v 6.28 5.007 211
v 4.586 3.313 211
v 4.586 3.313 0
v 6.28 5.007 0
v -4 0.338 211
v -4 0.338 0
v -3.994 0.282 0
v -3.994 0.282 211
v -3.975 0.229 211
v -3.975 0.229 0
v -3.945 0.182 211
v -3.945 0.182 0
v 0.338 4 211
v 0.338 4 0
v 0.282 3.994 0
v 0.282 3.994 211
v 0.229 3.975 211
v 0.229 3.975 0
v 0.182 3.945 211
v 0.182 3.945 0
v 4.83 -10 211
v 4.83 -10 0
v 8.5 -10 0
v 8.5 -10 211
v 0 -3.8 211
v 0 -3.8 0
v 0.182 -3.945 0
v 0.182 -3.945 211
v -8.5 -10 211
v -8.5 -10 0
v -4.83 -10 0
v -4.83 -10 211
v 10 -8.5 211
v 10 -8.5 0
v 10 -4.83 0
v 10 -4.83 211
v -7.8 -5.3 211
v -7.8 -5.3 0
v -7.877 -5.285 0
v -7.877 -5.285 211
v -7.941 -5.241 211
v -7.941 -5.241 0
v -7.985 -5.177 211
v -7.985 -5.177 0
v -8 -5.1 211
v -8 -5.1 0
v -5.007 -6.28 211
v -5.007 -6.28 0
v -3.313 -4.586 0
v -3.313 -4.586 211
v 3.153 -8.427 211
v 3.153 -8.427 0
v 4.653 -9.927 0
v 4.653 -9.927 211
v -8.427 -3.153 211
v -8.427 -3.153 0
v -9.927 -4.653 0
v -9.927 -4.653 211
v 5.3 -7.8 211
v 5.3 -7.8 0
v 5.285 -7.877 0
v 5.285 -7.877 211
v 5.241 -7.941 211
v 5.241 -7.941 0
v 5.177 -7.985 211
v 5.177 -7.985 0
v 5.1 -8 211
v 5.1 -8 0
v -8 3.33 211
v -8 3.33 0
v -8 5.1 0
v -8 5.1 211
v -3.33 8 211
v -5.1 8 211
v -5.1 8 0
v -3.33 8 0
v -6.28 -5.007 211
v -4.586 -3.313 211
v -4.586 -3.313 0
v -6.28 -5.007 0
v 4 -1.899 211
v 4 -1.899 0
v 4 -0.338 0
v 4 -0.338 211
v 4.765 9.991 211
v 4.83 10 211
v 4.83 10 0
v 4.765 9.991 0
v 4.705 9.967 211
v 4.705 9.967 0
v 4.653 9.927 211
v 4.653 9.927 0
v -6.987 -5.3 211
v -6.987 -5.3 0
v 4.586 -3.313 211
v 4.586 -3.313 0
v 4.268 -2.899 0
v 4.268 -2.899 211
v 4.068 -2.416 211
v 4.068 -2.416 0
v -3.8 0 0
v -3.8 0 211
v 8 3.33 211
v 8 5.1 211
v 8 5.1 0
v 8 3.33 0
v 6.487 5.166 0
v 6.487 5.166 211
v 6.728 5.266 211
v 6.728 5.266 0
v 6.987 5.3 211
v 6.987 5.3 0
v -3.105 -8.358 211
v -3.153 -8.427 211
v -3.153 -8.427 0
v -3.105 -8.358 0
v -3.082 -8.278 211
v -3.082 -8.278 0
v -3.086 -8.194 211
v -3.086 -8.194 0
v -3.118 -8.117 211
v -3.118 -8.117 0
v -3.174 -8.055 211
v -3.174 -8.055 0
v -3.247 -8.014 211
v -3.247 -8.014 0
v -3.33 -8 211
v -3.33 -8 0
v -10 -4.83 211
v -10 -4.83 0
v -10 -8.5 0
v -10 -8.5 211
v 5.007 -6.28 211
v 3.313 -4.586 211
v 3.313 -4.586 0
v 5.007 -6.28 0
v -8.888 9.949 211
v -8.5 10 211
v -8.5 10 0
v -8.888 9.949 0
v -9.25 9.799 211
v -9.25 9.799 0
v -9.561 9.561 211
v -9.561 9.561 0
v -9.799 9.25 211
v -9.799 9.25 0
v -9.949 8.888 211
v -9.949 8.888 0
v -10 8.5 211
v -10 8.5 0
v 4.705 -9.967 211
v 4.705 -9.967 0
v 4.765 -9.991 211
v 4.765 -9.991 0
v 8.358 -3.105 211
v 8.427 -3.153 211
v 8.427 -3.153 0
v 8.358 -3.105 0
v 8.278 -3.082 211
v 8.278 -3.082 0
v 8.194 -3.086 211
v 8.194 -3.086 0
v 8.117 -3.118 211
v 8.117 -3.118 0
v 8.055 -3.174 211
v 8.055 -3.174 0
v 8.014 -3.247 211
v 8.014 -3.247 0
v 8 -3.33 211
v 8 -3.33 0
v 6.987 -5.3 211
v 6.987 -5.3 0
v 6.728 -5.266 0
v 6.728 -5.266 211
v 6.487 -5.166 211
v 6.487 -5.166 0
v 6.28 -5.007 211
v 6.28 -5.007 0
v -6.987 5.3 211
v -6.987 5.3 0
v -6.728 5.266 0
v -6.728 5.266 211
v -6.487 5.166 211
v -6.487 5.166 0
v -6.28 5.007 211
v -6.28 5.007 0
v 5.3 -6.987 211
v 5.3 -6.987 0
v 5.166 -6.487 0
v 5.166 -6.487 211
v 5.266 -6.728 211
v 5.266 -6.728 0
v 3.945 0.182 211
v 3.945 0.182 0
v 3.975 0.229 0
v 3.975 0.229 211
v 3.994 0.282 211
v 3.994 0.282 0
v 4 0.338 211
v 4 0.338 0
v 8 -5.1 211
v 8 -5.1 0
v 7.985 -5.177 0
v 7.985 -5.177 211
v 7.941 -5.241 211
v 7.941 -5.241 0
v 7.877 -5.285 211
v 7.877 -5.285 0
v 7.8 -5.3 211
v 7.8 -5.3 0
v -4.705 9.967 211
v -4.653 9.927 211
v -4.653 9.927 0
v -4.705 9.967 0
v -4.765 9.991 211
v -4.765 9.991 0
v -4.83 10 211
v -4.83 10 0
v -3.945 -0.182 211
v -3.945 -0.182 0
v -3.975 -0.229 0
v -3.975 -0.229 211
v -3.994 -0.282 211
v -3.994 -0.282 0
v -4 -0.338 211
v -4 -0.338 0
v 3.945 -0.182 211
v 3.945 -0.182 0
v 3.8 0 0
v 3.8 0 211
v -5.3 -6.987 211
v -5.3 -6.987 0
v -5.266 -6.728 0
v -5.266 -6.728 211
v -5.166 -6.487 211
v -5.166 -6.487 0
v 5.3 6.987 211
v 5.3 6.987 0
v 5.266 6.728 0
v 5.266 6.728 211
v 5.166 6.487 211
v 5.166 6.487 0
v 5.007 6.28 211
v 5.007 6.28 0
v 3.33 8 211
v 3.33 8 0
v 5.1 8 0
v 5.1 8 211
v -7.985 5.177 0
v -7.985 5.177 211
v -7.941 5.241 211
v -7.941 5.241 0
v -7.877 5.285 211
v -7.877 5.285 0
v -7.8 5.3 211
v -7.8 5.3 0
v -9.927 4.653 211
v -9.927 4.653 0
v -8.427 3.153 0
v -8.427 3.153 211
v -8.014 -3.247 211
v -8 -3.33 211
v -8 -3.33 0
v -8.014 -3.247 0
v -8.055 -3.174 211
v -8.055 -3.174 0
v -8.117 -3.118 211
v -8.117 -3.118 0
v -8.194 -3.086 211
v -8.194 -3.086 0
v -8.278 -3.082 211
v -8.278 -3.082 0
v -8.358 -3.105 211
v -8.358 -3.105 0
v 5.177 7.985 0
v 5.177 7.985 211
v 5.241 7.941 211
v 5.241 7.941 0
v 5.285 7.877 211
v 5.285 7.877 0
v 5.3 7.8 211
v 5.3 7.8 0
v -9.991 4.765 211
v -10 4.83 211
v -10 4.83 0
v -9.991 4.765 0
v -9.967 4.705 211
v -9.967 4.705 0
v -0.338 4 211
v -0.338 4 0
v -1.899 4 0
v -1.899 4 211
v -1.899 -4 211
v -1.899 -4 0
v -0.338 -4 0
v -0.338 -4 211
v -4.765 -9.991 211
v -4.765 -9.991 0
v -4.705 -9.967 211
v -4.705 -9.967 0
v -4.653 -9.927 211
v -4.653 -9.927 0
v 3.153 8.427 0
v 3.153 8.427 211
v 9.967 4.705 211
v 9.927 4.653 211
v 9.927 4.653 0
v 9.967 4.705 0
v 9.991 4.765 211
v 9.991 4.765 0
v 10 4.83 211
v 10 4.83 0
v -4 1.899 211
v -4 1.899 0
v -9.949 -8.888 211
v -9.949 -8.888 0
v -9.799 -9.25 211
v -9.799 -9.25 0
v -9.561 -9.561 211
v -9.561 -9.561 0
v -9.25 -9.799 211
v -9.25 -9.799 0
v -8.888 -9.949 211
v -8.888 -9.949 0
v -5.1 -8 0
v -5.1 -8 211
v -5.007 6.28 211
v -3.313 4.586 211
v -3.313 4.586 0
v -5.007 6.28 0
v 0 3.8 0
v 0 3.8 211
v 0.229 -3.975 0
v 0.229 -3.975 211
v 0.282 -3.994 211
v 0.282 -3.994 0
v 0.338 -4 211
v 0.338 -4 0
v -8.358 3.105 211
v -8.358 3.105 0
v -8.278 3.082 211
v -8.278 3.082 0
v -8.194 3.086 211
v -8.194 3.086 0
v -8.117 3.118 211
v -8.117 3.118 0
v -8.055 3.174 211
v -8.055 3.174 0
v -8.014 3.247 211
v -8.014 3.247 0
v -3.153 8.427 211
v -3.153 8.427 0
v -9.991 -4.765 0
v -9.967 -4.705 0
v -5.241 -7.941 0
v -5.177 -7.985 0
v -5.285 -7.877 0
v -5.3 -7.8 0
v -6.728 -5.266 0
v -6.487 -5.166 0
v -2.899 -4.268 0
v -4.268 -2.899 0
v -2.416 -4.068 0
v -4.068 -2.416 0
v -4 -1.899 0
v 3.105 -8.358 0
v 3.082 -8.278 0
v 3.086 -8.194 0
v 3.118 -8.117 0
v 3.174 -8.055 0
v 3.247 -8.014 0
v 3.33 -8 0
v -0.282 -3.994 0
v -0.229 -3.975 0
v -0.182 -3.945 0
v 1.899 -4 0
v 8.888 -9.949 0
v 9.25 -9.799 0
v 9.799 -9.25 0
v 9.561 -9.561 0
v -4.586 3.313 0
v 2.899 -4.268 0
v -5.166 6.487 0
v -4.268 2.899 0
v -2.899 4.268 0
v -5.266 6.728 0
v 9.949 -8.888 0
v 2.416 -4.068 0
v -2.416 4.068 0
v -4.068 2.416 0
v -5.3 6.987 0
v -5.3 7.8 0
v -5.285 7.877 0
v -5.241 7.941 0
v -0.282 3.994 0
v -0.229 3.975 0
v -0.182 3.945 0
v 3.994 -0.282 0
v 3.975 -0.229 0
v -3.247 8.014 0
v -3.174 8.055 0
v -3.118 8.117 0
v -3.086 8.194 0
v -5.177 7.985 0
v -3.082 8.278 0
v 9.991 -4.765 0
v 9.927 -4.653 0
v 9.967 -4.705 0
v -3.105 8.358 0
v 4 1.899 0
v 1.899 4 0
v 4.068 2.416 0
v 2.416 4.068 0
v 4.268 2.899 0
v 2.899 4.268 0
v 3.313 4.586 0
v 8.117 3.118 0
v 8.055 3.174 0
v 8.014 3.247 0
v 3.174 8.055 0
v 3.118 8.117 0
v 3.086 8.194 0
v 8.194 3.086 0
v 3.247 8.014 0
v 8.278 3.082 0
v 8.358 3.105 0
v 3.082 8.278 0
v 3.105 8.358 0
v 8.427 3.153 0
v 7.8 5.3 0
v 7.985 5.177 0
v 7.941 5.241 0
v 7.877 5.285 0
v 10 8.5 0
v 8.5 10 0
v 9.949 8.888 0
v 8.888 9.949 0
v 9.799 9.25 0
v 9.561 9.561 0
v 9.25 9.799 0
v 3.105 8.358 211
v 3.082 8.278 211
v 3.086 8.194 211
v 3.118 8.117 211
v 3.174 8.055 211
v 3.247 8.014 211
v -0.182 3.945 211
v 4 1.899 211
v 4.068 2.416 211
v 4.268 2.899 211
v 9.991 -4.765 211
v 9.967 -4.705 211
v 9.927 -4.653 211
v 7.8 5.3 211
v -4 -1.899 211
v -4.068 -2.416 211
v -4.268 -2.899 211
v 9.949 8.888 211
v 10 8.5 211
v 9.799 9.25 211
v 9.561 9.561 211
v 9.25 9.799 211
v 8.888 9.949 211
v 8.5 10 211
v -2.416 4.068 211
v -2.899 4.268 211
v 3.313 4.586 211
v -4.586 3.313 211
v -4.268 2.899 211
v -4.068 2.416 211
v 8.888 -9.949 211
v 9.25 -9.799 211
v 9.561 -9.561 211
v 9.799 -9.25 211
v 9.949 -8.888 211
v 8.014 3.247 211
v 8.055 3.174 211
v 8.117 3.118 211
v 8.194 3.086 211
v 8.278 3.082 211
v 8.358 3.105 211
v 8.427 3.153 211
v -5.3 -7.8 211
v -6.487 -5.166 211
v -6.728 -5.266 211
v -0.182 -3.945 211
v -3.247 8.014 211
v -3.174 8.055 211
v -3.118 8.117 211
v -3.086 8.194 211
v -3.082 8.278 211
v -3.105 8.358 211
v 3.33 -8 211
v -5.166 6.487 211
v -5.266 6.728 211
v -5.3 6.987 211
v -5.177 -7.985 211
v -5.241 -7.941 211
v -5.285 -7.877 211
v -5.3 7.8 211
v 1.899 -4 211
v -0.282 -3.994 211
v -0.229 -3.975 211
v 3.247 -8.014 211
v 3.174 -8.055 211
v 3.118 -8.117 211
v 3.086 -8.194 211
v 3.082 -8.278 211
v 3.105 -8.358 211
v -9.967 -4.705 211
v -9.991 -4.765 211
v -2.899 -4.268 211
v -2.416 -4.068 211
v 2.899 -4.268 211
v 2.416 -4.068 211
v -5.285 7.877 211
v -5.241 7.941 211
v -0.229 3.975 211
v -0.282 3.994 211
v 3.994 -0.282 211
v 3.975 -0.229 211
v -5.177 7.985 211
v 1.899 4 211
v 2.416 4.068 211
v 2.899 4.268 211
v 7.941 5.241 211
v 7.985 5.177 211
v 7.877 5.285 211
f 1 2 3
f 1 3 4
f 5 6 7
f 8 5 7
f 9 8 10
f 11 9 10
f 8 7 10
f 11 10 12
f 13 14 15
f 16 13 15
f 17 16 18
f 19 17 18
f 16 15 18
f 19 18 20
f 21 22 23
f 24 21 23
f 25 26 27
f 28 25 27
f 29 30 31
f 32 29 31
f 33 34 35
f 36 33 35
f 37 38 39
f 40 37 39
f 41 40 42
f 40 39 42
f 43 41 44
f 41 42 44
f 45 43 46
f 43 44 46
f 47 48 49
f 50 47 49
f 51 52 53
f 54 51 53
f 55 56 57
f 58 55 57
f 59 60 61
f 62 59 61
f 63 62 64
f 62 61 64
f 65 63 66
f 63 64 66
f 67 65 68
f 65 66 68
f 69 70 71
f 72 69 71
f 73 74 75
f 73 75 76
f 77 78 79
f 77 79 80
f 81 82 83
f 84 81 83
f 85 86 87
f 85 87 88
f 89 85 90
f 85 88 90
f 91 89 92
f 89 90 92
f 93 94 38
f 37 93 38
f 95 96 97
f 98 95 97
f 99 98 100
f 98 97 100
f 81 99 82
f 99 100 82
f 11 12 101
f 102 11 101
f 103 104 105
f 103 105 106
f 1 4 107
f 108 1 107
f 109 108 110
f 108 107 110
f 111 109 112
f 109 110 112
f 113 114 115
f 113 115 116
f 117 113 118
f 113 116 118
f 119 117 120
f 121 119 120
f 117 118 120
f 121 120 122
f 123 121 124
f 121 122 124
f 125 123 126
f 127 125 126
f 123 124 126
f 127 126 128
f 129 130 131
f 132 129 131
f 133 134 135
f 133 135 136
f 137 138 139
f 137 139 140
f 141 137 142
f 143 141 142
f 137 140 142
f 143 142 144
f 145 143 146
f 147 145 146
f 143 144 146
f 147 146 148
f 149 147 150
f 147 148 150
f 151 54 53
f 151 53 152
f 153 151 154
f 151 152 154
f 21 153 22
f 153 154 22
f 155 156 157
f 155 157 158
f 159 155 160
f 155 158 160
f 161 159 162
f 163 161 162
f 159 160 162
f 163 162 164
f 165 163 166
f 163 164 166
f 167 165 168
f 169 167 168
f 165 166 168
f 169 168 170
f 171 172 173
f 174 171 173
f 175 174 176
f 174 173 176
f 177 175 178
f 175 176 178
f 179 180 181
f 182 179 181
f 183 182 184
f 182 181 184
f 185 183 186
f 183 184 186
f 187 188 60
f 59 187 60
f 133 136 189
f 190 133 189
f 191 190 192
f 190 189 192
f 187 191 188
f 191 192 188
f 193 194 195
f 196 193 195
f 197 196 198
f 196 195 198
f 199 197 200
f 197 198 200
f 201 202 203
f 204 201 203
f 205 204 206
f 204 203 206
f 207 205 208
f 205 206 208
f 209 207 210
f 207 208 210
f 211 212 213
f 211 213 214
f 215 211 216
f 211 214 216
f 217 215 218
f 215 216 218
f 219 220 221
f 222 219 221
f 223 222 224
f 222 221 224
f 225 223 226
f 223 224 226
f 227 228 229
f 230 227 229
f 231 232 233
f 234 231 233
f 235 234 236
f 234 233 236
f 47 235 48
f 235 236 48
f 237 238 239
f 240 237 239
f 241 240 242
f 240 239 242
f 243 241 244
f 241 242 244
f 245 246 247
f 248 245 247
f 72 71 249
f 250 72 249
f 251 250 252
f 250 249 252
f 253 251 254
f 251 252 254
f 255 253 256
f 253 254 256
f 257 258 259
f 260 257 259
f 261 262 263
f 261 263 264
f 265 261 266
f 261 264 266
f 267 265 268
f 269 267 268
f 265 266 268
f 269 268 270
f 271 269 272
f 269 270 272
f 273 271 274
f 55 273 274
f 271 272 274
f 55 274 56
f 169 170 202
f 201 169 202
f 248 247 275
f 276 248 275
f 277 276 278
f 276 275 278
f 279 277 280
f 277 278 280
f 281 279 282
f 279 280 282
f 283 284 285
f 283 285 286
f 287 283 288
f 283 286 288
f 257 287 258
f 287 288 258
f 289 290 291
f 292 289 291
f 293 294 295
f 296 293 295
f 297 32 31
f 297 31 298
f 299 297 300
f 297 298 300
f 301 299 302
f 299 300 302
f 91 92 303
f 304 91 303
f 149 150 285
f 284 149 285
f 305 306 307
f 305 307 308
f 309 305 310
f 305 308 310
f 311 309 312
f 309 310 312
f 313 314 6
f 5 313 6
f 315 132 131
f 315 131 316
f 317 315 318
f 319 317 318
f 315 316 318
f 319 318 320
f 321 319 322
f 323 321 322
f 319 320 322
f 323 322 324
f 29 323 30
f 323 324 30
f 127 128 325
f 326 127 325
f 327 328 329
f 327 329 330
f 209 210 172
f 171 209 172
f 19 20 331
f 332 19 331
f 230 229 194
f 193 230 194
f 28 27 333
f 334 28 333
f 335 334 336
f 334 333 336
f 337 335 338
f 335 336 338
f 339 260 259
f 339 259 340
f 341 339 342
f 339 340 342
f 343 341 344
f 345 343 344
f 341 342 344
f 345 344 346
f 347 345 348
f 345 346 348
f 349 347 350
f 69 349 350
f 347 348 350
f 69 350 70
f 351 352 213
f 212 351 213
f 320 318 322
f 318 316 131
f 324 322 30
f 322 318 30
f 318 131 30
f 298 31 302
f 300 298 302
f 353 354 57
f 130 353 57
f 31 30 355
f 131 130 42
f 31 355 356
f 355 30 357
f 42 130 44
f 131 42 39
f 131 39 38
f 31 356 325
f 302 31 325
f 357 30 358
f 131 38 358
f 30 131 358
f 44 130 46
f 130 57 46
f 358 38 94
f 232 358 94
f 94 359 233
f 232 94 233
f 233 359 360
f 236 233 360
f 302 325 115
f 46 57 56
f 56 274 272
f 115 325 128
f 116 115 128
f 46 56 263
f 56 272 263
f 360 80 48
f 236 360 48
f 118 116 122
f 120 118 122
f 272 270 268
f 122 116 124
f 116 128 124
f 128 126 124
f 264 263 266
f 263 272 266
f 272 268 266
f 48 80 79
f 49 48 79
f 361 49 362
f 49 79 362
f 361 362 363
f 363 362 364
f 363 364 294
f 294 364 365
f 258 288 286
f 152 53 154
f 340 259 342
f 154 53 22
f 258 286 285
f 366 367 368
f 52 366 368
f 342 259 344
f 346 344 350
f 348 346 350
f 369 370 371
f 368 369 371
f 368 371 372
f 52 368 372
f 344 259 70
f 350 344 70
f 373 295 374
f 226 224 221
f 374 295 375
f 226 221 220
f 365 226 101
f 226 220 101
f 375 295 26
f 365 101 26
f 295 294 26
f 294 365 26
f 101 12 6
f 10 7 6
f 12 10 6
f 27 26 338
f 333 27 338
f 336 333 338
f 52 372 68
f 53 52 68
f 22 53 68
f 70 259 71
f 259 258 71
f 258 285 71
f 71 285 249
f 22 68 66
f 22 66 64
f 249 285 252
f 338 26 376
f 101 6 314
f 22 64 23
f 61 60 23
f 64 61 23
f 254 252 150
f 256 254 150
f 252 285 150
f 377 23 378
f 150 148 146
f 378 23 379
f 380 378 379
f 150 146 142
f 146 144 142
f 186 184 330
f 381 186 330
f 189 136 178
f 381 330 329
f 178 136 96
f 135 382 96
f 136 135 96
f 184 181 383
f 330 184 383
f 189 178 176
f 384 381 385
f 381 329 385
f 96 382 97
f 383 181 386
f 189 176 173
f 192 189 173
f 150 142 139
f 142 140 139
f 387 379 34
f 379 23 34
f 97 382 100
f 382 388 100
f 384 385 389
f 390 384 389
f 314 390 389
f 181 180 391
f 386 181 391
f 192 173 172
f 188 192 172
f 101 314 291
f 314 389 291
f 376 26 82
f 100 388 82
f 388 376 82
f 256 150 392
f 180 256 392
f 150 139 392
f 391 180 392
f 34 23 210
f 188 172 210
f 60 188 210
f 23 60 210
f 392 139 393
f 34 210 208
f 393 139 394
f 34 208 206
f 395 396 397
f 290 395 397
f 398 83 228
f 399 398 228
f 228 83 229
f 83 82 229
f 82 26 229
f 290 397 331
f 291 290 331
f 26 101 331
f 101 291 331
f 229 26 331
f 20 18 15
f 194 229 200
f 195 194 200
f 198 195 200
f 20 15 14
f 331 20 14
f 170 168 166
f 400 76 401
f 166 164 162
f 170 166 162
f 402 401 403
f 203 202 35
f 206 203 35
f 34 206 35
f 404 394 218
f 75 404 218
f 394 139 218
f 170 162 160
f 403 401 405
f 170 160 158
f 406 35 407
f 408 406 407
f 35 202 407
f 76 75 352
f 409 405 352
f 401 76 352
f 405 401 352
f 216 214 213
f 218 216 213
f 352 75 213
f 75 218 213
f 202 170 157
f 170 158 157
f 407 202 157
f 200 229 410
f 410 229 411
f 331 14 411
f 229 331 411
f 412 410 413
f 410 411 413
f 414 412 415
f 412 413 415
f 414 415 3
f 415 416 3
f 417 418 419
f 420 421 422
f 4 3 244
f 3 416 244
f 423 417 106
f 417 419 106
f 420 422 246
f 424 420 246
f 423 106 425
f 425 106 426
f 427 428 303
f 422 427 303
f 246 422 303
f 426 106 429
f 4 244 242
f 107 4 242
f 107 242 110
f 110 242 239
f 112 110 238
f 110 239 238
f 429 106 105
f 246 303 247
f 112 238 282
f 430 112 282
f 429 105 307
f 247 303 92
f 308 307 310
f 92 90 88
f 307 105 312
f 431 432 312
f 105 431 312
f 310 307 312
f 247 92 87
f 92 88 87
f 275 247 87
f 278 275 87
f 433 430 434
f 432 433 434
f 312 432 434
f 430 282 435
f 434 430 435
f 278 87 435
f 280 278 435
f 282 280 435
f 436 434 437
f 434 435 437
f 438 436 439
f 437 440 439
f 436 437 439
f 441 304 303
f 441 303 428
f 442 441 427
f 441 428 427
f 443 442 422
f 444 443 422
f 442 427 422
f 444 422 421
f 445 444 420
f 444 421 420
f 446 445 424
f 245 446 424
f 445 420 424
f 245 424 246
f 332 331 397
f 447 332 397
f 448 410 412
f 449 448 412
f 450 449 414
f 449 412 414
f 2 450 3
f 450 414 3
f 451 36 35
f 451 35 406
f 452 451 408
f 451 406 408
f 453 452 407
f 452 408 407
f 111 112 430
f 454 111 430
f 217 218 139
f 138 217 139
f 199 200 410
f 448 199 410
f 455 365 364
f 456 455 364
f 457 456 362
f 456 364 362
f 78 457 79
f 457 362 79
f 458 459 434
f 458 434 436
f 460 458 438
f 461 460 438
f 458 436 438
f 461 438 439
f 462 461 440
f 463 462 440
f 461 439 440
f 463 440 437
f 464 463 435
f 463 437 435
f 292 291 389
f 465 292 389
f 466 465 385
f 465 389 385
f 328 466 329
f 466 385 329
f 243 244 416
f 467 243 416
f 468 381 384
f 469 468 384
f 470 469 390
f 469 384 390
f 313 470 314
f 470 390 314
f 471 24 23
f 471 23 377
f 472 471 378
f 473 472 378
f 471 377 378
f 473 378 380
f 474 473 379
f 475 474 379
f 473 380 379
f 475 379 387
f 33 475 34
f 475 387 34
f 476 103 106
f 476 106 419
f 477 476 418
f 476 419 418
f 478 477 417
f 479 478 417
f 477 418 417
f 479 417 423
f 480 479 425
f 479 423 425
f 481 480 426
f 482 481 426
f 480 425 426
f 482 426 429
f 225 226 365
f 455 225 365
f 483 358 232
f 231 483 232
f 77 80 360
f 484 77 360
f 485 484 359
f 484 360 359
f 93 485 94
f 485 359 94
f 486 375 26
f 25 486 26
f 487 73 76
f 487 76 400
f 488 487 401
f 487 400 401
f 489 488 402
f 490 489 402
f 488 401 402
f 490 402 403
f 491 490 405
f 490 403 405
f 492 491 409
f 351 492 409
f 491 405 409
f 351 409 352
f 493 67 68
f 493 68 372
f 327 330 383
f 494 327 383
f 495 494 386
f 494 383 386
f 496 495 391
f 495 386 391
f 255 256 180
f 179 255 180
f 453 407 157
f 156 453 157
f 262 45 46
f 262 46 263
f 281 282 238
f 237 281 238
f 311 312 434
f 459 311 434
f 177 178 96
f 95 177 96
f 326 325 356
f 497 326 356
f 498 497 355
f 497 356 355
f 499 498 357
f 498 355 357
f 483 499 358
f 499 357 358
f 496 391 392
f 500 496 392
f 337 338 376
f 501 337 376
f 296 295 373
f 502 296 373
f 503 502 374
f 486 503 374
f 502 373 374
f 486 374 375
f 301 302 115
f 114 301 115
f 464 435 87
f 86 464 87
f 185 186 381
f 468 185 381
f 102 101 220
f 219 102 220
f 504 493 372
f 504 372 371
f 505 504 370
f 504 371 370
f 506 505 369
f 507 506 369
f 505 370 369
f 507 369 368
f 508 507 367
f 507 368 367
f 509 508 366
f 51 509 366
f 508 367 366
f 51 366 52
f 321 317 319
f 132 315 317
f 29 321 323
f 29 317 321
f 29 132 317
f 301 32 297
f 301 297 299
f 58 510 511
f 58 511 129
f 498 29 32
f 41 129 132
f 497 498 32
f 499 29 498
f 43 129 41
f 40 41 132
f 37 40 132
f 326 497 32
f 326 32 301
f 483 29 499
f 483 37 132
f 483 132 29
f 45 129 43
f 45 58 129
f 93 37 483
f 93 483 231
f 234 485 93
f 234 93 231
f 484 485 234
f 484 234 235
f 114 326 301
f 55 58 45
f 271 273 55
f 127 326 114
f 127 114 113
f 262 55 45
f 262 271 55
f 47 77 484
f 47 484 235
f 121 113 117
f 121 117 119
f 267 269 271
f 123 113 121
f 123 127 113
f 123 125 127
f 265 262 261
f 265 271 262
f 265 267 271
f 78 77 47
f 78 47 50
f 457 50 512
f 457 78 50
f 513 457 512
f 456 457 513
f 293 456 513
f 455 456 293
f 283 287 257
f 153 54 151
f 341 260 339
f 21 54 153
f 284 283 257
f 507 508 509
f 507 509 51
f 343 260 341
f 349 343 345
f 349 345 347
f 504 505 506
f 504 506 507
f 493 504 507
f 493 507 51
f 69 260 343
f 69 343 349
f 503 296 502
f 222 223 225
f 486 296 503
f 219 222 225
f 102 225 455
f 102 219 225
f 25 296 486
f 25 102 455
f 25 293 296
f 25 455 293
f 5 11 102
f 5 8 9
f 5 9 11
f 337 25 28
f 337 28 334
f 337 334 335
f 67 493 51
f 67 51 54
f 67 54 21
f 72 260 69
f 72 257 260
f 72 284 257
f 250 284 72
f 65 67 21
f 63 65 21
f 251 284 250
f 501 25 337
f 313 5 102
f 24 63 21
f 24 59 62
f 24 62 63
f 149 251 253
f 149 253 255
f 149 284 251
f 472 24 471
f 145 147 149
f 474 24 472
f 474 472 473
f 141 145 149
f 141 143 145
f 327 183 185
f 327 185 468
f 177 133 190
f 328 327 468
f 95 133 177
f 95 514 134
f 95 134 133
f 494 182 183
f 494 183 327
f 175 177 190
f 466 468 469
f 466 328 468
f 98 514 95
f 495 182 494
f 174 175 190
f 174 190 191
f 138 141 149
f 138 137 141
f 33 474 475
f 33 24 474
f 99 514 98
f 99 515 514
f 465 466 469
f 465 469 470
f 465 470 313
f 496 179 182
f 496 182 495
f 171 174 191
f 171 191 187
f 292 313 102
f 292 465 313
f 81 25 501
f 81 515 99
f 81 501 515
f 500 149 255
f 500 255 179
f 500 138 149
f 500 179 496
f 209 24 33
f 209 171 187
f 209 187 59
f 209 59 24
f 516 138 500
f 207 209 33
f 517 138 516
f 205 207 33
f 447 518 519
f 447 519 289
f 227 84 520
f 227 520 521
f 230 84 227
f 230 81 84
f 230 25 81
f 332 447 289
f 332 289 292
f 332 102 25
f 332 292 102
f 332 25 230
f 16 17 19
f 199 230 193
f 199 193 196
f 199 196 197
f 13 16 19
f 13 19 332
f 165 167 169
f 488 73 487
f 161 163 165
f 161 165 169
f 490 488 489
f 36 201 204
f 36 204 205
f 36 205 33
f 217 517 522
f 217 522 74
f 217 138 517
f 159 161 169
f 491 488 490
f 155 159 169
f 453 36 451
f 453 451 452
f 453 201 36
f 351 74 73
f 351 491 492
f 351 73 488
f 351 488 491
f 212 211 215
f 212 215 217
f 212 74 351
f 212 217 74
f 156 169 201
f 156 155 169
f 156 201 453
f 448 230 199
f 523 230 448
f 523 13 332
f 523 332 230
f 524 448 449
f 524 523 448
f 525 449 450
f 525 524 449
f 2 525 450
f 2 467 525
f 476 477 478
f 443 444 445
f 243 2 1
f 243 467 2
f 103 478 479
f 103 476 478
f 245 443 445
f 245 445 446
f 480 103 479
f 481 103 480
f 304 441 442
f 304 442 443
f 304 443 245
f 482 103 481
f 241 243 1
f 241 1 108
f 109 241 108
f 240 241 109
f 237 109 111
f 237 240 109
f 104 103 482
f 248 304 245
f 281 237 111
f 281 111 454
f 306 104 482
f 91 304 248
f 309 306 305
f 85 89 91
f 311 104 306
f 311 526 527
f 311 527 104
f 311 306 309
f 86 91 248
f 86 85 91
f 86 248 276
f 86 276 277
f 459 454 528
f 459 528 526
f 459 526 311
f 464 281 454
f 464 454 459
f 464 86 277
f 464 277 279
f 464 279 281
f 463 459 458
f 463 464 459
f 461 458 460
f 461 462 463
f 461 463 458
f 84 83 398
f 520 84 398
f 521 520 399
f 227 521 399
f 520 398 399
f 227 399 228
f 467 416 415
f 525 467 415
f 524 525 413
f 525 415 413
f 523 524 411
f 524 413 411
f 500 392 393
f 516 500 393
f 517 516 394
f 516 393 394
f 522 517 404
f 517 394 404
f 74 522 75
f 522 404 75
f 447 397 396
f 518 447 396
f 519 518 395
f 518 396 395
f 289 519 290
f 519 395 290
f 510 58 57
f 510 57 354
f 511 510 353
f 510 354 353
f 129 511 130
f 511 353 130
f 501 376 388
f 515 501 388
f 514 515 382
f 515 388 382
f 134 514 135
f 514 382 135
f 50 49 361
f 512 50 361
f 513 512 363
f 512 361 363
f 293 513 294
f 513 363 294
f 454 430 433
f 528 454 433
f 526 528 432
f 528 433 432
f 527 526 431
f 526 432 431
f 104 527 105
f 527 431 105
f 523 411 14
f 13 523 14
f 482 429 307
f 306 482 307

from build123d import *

# Parameters (mm, degrees)
EXTRUDE_1_DEPTH = 211


# Read off the part's stored shape, not the designer's step: 222 Конструкционный профиль 20х20-1-surface1
with BuildPart() as part:
    # Эскиз1 → Бобышка-Вытянуть1 (new body)
    with BuildSketch(Plane.XY):
        with BuildLine():
            Line((-3.945217202, 0.181521503), (-3.8, 0))
            Line((-3.8, 0), (-3.945217202, -0.181521503))
            ThreePointArc((-3.945217202, -0.181521503), (-3.98590708, -0.254943529), (-4, -0.337695265))
            Line((-4, -0.337695265), (-4, -1.898780669))
            ThreePointArc((-4, -1.898780669), (-4.152240935, -2.664147534), (-4.585786438, -3.312994231))
            Line((-4.585786438, -3.312994231), (-6.279898987, -5.007106781))
            ThreePointArc((-6.279898987, -5.007106781), (-6.604322336, -5.223879533), (-6.987005769, -5.3))
            Line((-6.987005769, -5.3), (-7.8, -5.3))
            ThreePointArc((-7.8, -5.3), (-7.941421356, -5.241421356), (-8, -5.1))
            Line((-8, -5.1), (-8, -3.33))
            ThreePointArc((-8, -3.33), (-8.154329142, -3.099030117), (-8.426776695, -3.153223305))
            Line((-8.426776695, -3.153223305), (-9.926776695, -4.653223305))
            ThreePointArc((-9.926776695, -4.653223305), (-9.980969883, -4.734329142), (-10, -4.83))
            Line((-10, -4.83), (-10, -8.5))
            ThreePointArc((-10, -8.5), (-9.560660172, -9.560660172), (-8.5, -10))
            Line((-8.5, -10), (-4.83, -10))
            ThreePointArc((-4.83, -10), (-4.734329142, -9.980969883), (-4.653223305, -9.926776695))
            Line((-4.653223305, -9.926776695), (-3.153223305, -8.426776695))
            ThreePointArc((-3.153223305, -8.426776695), (-3.099030117, -8.154329142), (-3.33, -8))
            Line((-3.33, -8), (-5.1, -8))
            ThreePointArc((-5.1, -8), (-5.241421356, -7.941421356), (-5.3, -7.8))
            Line((-5.3, -7.8), (-5.3, -6.987005769))
            ThreePointArc((-5.3, -6.987005769), (-5.223879533, -6.604322336), (-5.007106781, -6.279898987))
            Line((-5.007106781, -6.279898987), (-3.312994231, -4.585786438))
            ThreePointArc((-3.312994231, -4.585786438), (-2.664147534, -4.152240935), (-1.898780669, -4))
            Line((-1.898780669, -4), (-0.337695265, -4))
            ThreePointArc((-0.337695265, -4), (-0.254943529, -3.98590708), (-0.181521503, -3.945217202))
            Line((-0.181521503, -3.945217202), (0, -3.8))
            Line((0, -3.8), (0.181521503, -3.945217202))
            ThreePointArc((0.181521503, -3.945217202), (0.254943529, -3.98590708), (0.337695265, -4))
            Line((0.337695265, -4), (1.898780669, -4))
            ThreePointArc((1.898780669, -4), (2.664147534, -4.152240935), (3.312994231, -4.585786438))
            Line((3.312994231, -4.585786438), (5.007106781, -6.279898987))
            ThreePointArc((5.007106781, -6.279898987), (5.223879533, -6.604322336), (5.3, -6.987005769))
            Line((5.3, -6.987005769), (5.3, -7.8))
            ThreePointArc((5.3, -7.8), (5.241421356, -7.941421356), (5.1, -8))
            Line((5.1, -8), (3.33, -8))
            ThreePointArc((3.33, -8), (3.099030117, -8.154329142), (3.153223305, -8.426776695))
            Line((3.153223305, -8.426776695), (4.653223305, -9.926776695))
            ThreePointArc((4.653223305, -9.926776695), (4.734329142, -9.980969883), (4.83, -10))
            Line((4.83, -10), (8.5, -10))
            ThreePointArc((8.5, -10), (9.560660172, -9.560660172), (10, -8.5))
            Line((10, -8.5), (10, -4.83))
            ThreePointArc((10, -4.83), (9.980969883, -4.734329142), (9.926776695, -4.653223305))
            Line((9.926776695, -4.653223305), (8.426776695, -3.153223305))
            ThreePointArc((8.426776695, -3.153223305), (8.154329142, -3.099030117), (8, -3.33))
            Line((8, -3.33), (8, -5.1))
            ThreePointArc((8, -5.1), (7.941421356, -5.241421356), (7.8, -5.3))
            Line((7.8, -5.3), (6.987005769, -5.3))
            ThreePointArc((6.987005769, -5.3), (6.604322336, -5.223879533), (6.279898987, -5.007106781))
            Line((6.279898987, -5.007106781), (4.585786438, -3.312994231))
            ThreePointArc((4.585786438, -3.312994231), (4.152240935, -2.664147534), (4, -1.898780669))
            Line((4, -1.898780669), (4, -0.337695265))
            ThreePointArc((4, -0.337695265), (3.98590708, -0.254943529), (3.945217202, -0.181521503))
            Line((3.945217202, -0.181521503), (3.8, 0))
            Line((3.8, 0), (3.945217202, 0.181521503))
            ThreePointArc((3.945217202, 0.181521503), (3.98590708, 0.254943529), (4, 0.337695265))
            Line((4, 0.337695265), (4, 1.898780669))
            ThreePointArc((4, 1.898780669), (4.152240935, 2.664147534), (4.585786438, 3.312994231))
            Line((4.585786438, 3.312994231), (6.279898987, 5.007106781))
            ThreePointArc((6.279898987, 5.007106781), (6.604322336, 5.223879533), (6.987005769, 5.3))
            Line((6.987005769, 5.3), (7.8, 5.3))
            ThreePointArc((7.8, 5.3), (7.941421356, 5.241421356), (8, 5.1))
            Line((8, 5.1), (8, 3.33))
            ThreePointArc((8, 3.33), (8.154329142, 3.099030117), (8.426776695, 3.153223305))
            Line((8.426776695, 3.153223305), (9.926776695, 4.653223305))
            ThreePointArc((9.926776695, 4.653223305), (9.980969883, 4.734329142), (10, 4.83))
            Line((10, 4.83), (10, 8.5))
            ThreePointArc((10, 8.5), (9.560660172, 9.560660172), (8.5, 10))
            Line((8.5, 10), (4.83, 10))
            ThreePointArc((4.83, 10), (4.734329142, 9.980969883), (4.653223305, 9.926776695))
            Line((4.653223305, 9.926776695), (3.153223305, 8.426776695))
            ThreePointArc((3.153223305, 8.426776695), (3.099030117, 8.154329142), (3.33, 8))
            Line((3.33, 8), (5.1, 8))
            ThreePointArc((5.1, 8), (5.241421356, 7.941421356), (5.3, 7.8))
            Line((5.3, 7.8), (5.3, 6.987005769))
            ThreePointArc((5.3, 6.987005769), (5.223879533, 6.604322336), (5.007106781, 6.279898987))
            Line((5.007106781, 6.279898987), (3.312994231, 4.585786438))
            ThreePointArc((3.312994231, 4.585786438), (2.664147534, 4.152240935), (1.898780669, 4))
            Line((1.898780669, 4), (0.337695265, 4))
            ThreePointArc((0.337695265, 4), (0.254943529, 3.98590708), (0.181521503, 3.945217202))
            Line((0.181521503, 3.945217202), (0, 3.8))
            Line((0, 3.8), (-0.181521503, 3.945217202))
            ThreePointArc((-0.181521503, 3.945217202), (-0.254943529, 3.98590708), (-0.337695265, 4))
            Line((-0.337695265, 4), (-1.898780669, 4))
            ThreePointArc((-1.898780669, 4), (-2.664147534, 4.152240935), (-3.312994231, 4.585786438))
            Line((-3.312994231, 4.585786438), (-5.007106781, 6.279898987))
            ThreePointArc((-5.007106781, 6.279898987), (-5.223879533, 6.604322336), (-5.3, 6.987005769))
            Line((-5.3, 6.987005769), (-5.3, 7.8))
            ThreePointArc((-5.3, 7.8), (-5.241421356, 7.941421356), (-5.1, 8))
            Line((-5.1, 8), (-3.33, 8))
            ThreePointArc((-3.33, 8), (-3.099030117, 8.154329142), (-3.153223305, 8.426776695))
            Line((-3.153223305, 8.426776695), (-4.653223305, 9.926776695))
            ThreePointArc((-4.653223305, 9.926776695), (-4.734329142, 9.980969883), (-4.83, 10))
            Line((-4.83, 10), (-8.5, 10))
            ThreePointArc((-8.5, 10), (-9.560660172, 9.560660172), (-10, 8.5))
            Line((-10, 8.5), (-10, 4.83))
            ThreePointArc((-10, 4.83), (-9.980969883, 4.734329142), (-9.926776695, 4.653223305))
            Line((-9.926776695, 4.653223305), (-8.426776695, 3.153223305))
            ThreePointArc((-8.426776695, 3.153223305), (-8.154329142, 3.099030117), (-8, 3.33))
            Line((-8, 3.33), (-8, 5.1))
            ThreePointArc((-8, 5.1), (-7.941421356, 5.241421356), (-7.8, 5.3))
            Line((-7.8, 5.3), (-6.987005769, 5.3))
            ThreePointArc((-6.987005769, 5.3), (-6.604322336, 5.223879533), (-6.279898987, 5.007106781))
            Line((-6.279898987, 5.007106781), (-4.585786438, 3.312994231))
            ThreePointArc((-4.585786438, 3.312994231), (-4.152240935, 2.664147534), (-4, 1.898780669))
            Line((-4, 1.898780669), (-4, 0.337695265))
            ThreePointArc((-4, 0.337695265), (-3.98590708, 0.254943529), (-3.945217202, 0.181521503))
        make_face()
    extrude(amount=EXTRUDE_1_DEPTH)


solid = part.part
